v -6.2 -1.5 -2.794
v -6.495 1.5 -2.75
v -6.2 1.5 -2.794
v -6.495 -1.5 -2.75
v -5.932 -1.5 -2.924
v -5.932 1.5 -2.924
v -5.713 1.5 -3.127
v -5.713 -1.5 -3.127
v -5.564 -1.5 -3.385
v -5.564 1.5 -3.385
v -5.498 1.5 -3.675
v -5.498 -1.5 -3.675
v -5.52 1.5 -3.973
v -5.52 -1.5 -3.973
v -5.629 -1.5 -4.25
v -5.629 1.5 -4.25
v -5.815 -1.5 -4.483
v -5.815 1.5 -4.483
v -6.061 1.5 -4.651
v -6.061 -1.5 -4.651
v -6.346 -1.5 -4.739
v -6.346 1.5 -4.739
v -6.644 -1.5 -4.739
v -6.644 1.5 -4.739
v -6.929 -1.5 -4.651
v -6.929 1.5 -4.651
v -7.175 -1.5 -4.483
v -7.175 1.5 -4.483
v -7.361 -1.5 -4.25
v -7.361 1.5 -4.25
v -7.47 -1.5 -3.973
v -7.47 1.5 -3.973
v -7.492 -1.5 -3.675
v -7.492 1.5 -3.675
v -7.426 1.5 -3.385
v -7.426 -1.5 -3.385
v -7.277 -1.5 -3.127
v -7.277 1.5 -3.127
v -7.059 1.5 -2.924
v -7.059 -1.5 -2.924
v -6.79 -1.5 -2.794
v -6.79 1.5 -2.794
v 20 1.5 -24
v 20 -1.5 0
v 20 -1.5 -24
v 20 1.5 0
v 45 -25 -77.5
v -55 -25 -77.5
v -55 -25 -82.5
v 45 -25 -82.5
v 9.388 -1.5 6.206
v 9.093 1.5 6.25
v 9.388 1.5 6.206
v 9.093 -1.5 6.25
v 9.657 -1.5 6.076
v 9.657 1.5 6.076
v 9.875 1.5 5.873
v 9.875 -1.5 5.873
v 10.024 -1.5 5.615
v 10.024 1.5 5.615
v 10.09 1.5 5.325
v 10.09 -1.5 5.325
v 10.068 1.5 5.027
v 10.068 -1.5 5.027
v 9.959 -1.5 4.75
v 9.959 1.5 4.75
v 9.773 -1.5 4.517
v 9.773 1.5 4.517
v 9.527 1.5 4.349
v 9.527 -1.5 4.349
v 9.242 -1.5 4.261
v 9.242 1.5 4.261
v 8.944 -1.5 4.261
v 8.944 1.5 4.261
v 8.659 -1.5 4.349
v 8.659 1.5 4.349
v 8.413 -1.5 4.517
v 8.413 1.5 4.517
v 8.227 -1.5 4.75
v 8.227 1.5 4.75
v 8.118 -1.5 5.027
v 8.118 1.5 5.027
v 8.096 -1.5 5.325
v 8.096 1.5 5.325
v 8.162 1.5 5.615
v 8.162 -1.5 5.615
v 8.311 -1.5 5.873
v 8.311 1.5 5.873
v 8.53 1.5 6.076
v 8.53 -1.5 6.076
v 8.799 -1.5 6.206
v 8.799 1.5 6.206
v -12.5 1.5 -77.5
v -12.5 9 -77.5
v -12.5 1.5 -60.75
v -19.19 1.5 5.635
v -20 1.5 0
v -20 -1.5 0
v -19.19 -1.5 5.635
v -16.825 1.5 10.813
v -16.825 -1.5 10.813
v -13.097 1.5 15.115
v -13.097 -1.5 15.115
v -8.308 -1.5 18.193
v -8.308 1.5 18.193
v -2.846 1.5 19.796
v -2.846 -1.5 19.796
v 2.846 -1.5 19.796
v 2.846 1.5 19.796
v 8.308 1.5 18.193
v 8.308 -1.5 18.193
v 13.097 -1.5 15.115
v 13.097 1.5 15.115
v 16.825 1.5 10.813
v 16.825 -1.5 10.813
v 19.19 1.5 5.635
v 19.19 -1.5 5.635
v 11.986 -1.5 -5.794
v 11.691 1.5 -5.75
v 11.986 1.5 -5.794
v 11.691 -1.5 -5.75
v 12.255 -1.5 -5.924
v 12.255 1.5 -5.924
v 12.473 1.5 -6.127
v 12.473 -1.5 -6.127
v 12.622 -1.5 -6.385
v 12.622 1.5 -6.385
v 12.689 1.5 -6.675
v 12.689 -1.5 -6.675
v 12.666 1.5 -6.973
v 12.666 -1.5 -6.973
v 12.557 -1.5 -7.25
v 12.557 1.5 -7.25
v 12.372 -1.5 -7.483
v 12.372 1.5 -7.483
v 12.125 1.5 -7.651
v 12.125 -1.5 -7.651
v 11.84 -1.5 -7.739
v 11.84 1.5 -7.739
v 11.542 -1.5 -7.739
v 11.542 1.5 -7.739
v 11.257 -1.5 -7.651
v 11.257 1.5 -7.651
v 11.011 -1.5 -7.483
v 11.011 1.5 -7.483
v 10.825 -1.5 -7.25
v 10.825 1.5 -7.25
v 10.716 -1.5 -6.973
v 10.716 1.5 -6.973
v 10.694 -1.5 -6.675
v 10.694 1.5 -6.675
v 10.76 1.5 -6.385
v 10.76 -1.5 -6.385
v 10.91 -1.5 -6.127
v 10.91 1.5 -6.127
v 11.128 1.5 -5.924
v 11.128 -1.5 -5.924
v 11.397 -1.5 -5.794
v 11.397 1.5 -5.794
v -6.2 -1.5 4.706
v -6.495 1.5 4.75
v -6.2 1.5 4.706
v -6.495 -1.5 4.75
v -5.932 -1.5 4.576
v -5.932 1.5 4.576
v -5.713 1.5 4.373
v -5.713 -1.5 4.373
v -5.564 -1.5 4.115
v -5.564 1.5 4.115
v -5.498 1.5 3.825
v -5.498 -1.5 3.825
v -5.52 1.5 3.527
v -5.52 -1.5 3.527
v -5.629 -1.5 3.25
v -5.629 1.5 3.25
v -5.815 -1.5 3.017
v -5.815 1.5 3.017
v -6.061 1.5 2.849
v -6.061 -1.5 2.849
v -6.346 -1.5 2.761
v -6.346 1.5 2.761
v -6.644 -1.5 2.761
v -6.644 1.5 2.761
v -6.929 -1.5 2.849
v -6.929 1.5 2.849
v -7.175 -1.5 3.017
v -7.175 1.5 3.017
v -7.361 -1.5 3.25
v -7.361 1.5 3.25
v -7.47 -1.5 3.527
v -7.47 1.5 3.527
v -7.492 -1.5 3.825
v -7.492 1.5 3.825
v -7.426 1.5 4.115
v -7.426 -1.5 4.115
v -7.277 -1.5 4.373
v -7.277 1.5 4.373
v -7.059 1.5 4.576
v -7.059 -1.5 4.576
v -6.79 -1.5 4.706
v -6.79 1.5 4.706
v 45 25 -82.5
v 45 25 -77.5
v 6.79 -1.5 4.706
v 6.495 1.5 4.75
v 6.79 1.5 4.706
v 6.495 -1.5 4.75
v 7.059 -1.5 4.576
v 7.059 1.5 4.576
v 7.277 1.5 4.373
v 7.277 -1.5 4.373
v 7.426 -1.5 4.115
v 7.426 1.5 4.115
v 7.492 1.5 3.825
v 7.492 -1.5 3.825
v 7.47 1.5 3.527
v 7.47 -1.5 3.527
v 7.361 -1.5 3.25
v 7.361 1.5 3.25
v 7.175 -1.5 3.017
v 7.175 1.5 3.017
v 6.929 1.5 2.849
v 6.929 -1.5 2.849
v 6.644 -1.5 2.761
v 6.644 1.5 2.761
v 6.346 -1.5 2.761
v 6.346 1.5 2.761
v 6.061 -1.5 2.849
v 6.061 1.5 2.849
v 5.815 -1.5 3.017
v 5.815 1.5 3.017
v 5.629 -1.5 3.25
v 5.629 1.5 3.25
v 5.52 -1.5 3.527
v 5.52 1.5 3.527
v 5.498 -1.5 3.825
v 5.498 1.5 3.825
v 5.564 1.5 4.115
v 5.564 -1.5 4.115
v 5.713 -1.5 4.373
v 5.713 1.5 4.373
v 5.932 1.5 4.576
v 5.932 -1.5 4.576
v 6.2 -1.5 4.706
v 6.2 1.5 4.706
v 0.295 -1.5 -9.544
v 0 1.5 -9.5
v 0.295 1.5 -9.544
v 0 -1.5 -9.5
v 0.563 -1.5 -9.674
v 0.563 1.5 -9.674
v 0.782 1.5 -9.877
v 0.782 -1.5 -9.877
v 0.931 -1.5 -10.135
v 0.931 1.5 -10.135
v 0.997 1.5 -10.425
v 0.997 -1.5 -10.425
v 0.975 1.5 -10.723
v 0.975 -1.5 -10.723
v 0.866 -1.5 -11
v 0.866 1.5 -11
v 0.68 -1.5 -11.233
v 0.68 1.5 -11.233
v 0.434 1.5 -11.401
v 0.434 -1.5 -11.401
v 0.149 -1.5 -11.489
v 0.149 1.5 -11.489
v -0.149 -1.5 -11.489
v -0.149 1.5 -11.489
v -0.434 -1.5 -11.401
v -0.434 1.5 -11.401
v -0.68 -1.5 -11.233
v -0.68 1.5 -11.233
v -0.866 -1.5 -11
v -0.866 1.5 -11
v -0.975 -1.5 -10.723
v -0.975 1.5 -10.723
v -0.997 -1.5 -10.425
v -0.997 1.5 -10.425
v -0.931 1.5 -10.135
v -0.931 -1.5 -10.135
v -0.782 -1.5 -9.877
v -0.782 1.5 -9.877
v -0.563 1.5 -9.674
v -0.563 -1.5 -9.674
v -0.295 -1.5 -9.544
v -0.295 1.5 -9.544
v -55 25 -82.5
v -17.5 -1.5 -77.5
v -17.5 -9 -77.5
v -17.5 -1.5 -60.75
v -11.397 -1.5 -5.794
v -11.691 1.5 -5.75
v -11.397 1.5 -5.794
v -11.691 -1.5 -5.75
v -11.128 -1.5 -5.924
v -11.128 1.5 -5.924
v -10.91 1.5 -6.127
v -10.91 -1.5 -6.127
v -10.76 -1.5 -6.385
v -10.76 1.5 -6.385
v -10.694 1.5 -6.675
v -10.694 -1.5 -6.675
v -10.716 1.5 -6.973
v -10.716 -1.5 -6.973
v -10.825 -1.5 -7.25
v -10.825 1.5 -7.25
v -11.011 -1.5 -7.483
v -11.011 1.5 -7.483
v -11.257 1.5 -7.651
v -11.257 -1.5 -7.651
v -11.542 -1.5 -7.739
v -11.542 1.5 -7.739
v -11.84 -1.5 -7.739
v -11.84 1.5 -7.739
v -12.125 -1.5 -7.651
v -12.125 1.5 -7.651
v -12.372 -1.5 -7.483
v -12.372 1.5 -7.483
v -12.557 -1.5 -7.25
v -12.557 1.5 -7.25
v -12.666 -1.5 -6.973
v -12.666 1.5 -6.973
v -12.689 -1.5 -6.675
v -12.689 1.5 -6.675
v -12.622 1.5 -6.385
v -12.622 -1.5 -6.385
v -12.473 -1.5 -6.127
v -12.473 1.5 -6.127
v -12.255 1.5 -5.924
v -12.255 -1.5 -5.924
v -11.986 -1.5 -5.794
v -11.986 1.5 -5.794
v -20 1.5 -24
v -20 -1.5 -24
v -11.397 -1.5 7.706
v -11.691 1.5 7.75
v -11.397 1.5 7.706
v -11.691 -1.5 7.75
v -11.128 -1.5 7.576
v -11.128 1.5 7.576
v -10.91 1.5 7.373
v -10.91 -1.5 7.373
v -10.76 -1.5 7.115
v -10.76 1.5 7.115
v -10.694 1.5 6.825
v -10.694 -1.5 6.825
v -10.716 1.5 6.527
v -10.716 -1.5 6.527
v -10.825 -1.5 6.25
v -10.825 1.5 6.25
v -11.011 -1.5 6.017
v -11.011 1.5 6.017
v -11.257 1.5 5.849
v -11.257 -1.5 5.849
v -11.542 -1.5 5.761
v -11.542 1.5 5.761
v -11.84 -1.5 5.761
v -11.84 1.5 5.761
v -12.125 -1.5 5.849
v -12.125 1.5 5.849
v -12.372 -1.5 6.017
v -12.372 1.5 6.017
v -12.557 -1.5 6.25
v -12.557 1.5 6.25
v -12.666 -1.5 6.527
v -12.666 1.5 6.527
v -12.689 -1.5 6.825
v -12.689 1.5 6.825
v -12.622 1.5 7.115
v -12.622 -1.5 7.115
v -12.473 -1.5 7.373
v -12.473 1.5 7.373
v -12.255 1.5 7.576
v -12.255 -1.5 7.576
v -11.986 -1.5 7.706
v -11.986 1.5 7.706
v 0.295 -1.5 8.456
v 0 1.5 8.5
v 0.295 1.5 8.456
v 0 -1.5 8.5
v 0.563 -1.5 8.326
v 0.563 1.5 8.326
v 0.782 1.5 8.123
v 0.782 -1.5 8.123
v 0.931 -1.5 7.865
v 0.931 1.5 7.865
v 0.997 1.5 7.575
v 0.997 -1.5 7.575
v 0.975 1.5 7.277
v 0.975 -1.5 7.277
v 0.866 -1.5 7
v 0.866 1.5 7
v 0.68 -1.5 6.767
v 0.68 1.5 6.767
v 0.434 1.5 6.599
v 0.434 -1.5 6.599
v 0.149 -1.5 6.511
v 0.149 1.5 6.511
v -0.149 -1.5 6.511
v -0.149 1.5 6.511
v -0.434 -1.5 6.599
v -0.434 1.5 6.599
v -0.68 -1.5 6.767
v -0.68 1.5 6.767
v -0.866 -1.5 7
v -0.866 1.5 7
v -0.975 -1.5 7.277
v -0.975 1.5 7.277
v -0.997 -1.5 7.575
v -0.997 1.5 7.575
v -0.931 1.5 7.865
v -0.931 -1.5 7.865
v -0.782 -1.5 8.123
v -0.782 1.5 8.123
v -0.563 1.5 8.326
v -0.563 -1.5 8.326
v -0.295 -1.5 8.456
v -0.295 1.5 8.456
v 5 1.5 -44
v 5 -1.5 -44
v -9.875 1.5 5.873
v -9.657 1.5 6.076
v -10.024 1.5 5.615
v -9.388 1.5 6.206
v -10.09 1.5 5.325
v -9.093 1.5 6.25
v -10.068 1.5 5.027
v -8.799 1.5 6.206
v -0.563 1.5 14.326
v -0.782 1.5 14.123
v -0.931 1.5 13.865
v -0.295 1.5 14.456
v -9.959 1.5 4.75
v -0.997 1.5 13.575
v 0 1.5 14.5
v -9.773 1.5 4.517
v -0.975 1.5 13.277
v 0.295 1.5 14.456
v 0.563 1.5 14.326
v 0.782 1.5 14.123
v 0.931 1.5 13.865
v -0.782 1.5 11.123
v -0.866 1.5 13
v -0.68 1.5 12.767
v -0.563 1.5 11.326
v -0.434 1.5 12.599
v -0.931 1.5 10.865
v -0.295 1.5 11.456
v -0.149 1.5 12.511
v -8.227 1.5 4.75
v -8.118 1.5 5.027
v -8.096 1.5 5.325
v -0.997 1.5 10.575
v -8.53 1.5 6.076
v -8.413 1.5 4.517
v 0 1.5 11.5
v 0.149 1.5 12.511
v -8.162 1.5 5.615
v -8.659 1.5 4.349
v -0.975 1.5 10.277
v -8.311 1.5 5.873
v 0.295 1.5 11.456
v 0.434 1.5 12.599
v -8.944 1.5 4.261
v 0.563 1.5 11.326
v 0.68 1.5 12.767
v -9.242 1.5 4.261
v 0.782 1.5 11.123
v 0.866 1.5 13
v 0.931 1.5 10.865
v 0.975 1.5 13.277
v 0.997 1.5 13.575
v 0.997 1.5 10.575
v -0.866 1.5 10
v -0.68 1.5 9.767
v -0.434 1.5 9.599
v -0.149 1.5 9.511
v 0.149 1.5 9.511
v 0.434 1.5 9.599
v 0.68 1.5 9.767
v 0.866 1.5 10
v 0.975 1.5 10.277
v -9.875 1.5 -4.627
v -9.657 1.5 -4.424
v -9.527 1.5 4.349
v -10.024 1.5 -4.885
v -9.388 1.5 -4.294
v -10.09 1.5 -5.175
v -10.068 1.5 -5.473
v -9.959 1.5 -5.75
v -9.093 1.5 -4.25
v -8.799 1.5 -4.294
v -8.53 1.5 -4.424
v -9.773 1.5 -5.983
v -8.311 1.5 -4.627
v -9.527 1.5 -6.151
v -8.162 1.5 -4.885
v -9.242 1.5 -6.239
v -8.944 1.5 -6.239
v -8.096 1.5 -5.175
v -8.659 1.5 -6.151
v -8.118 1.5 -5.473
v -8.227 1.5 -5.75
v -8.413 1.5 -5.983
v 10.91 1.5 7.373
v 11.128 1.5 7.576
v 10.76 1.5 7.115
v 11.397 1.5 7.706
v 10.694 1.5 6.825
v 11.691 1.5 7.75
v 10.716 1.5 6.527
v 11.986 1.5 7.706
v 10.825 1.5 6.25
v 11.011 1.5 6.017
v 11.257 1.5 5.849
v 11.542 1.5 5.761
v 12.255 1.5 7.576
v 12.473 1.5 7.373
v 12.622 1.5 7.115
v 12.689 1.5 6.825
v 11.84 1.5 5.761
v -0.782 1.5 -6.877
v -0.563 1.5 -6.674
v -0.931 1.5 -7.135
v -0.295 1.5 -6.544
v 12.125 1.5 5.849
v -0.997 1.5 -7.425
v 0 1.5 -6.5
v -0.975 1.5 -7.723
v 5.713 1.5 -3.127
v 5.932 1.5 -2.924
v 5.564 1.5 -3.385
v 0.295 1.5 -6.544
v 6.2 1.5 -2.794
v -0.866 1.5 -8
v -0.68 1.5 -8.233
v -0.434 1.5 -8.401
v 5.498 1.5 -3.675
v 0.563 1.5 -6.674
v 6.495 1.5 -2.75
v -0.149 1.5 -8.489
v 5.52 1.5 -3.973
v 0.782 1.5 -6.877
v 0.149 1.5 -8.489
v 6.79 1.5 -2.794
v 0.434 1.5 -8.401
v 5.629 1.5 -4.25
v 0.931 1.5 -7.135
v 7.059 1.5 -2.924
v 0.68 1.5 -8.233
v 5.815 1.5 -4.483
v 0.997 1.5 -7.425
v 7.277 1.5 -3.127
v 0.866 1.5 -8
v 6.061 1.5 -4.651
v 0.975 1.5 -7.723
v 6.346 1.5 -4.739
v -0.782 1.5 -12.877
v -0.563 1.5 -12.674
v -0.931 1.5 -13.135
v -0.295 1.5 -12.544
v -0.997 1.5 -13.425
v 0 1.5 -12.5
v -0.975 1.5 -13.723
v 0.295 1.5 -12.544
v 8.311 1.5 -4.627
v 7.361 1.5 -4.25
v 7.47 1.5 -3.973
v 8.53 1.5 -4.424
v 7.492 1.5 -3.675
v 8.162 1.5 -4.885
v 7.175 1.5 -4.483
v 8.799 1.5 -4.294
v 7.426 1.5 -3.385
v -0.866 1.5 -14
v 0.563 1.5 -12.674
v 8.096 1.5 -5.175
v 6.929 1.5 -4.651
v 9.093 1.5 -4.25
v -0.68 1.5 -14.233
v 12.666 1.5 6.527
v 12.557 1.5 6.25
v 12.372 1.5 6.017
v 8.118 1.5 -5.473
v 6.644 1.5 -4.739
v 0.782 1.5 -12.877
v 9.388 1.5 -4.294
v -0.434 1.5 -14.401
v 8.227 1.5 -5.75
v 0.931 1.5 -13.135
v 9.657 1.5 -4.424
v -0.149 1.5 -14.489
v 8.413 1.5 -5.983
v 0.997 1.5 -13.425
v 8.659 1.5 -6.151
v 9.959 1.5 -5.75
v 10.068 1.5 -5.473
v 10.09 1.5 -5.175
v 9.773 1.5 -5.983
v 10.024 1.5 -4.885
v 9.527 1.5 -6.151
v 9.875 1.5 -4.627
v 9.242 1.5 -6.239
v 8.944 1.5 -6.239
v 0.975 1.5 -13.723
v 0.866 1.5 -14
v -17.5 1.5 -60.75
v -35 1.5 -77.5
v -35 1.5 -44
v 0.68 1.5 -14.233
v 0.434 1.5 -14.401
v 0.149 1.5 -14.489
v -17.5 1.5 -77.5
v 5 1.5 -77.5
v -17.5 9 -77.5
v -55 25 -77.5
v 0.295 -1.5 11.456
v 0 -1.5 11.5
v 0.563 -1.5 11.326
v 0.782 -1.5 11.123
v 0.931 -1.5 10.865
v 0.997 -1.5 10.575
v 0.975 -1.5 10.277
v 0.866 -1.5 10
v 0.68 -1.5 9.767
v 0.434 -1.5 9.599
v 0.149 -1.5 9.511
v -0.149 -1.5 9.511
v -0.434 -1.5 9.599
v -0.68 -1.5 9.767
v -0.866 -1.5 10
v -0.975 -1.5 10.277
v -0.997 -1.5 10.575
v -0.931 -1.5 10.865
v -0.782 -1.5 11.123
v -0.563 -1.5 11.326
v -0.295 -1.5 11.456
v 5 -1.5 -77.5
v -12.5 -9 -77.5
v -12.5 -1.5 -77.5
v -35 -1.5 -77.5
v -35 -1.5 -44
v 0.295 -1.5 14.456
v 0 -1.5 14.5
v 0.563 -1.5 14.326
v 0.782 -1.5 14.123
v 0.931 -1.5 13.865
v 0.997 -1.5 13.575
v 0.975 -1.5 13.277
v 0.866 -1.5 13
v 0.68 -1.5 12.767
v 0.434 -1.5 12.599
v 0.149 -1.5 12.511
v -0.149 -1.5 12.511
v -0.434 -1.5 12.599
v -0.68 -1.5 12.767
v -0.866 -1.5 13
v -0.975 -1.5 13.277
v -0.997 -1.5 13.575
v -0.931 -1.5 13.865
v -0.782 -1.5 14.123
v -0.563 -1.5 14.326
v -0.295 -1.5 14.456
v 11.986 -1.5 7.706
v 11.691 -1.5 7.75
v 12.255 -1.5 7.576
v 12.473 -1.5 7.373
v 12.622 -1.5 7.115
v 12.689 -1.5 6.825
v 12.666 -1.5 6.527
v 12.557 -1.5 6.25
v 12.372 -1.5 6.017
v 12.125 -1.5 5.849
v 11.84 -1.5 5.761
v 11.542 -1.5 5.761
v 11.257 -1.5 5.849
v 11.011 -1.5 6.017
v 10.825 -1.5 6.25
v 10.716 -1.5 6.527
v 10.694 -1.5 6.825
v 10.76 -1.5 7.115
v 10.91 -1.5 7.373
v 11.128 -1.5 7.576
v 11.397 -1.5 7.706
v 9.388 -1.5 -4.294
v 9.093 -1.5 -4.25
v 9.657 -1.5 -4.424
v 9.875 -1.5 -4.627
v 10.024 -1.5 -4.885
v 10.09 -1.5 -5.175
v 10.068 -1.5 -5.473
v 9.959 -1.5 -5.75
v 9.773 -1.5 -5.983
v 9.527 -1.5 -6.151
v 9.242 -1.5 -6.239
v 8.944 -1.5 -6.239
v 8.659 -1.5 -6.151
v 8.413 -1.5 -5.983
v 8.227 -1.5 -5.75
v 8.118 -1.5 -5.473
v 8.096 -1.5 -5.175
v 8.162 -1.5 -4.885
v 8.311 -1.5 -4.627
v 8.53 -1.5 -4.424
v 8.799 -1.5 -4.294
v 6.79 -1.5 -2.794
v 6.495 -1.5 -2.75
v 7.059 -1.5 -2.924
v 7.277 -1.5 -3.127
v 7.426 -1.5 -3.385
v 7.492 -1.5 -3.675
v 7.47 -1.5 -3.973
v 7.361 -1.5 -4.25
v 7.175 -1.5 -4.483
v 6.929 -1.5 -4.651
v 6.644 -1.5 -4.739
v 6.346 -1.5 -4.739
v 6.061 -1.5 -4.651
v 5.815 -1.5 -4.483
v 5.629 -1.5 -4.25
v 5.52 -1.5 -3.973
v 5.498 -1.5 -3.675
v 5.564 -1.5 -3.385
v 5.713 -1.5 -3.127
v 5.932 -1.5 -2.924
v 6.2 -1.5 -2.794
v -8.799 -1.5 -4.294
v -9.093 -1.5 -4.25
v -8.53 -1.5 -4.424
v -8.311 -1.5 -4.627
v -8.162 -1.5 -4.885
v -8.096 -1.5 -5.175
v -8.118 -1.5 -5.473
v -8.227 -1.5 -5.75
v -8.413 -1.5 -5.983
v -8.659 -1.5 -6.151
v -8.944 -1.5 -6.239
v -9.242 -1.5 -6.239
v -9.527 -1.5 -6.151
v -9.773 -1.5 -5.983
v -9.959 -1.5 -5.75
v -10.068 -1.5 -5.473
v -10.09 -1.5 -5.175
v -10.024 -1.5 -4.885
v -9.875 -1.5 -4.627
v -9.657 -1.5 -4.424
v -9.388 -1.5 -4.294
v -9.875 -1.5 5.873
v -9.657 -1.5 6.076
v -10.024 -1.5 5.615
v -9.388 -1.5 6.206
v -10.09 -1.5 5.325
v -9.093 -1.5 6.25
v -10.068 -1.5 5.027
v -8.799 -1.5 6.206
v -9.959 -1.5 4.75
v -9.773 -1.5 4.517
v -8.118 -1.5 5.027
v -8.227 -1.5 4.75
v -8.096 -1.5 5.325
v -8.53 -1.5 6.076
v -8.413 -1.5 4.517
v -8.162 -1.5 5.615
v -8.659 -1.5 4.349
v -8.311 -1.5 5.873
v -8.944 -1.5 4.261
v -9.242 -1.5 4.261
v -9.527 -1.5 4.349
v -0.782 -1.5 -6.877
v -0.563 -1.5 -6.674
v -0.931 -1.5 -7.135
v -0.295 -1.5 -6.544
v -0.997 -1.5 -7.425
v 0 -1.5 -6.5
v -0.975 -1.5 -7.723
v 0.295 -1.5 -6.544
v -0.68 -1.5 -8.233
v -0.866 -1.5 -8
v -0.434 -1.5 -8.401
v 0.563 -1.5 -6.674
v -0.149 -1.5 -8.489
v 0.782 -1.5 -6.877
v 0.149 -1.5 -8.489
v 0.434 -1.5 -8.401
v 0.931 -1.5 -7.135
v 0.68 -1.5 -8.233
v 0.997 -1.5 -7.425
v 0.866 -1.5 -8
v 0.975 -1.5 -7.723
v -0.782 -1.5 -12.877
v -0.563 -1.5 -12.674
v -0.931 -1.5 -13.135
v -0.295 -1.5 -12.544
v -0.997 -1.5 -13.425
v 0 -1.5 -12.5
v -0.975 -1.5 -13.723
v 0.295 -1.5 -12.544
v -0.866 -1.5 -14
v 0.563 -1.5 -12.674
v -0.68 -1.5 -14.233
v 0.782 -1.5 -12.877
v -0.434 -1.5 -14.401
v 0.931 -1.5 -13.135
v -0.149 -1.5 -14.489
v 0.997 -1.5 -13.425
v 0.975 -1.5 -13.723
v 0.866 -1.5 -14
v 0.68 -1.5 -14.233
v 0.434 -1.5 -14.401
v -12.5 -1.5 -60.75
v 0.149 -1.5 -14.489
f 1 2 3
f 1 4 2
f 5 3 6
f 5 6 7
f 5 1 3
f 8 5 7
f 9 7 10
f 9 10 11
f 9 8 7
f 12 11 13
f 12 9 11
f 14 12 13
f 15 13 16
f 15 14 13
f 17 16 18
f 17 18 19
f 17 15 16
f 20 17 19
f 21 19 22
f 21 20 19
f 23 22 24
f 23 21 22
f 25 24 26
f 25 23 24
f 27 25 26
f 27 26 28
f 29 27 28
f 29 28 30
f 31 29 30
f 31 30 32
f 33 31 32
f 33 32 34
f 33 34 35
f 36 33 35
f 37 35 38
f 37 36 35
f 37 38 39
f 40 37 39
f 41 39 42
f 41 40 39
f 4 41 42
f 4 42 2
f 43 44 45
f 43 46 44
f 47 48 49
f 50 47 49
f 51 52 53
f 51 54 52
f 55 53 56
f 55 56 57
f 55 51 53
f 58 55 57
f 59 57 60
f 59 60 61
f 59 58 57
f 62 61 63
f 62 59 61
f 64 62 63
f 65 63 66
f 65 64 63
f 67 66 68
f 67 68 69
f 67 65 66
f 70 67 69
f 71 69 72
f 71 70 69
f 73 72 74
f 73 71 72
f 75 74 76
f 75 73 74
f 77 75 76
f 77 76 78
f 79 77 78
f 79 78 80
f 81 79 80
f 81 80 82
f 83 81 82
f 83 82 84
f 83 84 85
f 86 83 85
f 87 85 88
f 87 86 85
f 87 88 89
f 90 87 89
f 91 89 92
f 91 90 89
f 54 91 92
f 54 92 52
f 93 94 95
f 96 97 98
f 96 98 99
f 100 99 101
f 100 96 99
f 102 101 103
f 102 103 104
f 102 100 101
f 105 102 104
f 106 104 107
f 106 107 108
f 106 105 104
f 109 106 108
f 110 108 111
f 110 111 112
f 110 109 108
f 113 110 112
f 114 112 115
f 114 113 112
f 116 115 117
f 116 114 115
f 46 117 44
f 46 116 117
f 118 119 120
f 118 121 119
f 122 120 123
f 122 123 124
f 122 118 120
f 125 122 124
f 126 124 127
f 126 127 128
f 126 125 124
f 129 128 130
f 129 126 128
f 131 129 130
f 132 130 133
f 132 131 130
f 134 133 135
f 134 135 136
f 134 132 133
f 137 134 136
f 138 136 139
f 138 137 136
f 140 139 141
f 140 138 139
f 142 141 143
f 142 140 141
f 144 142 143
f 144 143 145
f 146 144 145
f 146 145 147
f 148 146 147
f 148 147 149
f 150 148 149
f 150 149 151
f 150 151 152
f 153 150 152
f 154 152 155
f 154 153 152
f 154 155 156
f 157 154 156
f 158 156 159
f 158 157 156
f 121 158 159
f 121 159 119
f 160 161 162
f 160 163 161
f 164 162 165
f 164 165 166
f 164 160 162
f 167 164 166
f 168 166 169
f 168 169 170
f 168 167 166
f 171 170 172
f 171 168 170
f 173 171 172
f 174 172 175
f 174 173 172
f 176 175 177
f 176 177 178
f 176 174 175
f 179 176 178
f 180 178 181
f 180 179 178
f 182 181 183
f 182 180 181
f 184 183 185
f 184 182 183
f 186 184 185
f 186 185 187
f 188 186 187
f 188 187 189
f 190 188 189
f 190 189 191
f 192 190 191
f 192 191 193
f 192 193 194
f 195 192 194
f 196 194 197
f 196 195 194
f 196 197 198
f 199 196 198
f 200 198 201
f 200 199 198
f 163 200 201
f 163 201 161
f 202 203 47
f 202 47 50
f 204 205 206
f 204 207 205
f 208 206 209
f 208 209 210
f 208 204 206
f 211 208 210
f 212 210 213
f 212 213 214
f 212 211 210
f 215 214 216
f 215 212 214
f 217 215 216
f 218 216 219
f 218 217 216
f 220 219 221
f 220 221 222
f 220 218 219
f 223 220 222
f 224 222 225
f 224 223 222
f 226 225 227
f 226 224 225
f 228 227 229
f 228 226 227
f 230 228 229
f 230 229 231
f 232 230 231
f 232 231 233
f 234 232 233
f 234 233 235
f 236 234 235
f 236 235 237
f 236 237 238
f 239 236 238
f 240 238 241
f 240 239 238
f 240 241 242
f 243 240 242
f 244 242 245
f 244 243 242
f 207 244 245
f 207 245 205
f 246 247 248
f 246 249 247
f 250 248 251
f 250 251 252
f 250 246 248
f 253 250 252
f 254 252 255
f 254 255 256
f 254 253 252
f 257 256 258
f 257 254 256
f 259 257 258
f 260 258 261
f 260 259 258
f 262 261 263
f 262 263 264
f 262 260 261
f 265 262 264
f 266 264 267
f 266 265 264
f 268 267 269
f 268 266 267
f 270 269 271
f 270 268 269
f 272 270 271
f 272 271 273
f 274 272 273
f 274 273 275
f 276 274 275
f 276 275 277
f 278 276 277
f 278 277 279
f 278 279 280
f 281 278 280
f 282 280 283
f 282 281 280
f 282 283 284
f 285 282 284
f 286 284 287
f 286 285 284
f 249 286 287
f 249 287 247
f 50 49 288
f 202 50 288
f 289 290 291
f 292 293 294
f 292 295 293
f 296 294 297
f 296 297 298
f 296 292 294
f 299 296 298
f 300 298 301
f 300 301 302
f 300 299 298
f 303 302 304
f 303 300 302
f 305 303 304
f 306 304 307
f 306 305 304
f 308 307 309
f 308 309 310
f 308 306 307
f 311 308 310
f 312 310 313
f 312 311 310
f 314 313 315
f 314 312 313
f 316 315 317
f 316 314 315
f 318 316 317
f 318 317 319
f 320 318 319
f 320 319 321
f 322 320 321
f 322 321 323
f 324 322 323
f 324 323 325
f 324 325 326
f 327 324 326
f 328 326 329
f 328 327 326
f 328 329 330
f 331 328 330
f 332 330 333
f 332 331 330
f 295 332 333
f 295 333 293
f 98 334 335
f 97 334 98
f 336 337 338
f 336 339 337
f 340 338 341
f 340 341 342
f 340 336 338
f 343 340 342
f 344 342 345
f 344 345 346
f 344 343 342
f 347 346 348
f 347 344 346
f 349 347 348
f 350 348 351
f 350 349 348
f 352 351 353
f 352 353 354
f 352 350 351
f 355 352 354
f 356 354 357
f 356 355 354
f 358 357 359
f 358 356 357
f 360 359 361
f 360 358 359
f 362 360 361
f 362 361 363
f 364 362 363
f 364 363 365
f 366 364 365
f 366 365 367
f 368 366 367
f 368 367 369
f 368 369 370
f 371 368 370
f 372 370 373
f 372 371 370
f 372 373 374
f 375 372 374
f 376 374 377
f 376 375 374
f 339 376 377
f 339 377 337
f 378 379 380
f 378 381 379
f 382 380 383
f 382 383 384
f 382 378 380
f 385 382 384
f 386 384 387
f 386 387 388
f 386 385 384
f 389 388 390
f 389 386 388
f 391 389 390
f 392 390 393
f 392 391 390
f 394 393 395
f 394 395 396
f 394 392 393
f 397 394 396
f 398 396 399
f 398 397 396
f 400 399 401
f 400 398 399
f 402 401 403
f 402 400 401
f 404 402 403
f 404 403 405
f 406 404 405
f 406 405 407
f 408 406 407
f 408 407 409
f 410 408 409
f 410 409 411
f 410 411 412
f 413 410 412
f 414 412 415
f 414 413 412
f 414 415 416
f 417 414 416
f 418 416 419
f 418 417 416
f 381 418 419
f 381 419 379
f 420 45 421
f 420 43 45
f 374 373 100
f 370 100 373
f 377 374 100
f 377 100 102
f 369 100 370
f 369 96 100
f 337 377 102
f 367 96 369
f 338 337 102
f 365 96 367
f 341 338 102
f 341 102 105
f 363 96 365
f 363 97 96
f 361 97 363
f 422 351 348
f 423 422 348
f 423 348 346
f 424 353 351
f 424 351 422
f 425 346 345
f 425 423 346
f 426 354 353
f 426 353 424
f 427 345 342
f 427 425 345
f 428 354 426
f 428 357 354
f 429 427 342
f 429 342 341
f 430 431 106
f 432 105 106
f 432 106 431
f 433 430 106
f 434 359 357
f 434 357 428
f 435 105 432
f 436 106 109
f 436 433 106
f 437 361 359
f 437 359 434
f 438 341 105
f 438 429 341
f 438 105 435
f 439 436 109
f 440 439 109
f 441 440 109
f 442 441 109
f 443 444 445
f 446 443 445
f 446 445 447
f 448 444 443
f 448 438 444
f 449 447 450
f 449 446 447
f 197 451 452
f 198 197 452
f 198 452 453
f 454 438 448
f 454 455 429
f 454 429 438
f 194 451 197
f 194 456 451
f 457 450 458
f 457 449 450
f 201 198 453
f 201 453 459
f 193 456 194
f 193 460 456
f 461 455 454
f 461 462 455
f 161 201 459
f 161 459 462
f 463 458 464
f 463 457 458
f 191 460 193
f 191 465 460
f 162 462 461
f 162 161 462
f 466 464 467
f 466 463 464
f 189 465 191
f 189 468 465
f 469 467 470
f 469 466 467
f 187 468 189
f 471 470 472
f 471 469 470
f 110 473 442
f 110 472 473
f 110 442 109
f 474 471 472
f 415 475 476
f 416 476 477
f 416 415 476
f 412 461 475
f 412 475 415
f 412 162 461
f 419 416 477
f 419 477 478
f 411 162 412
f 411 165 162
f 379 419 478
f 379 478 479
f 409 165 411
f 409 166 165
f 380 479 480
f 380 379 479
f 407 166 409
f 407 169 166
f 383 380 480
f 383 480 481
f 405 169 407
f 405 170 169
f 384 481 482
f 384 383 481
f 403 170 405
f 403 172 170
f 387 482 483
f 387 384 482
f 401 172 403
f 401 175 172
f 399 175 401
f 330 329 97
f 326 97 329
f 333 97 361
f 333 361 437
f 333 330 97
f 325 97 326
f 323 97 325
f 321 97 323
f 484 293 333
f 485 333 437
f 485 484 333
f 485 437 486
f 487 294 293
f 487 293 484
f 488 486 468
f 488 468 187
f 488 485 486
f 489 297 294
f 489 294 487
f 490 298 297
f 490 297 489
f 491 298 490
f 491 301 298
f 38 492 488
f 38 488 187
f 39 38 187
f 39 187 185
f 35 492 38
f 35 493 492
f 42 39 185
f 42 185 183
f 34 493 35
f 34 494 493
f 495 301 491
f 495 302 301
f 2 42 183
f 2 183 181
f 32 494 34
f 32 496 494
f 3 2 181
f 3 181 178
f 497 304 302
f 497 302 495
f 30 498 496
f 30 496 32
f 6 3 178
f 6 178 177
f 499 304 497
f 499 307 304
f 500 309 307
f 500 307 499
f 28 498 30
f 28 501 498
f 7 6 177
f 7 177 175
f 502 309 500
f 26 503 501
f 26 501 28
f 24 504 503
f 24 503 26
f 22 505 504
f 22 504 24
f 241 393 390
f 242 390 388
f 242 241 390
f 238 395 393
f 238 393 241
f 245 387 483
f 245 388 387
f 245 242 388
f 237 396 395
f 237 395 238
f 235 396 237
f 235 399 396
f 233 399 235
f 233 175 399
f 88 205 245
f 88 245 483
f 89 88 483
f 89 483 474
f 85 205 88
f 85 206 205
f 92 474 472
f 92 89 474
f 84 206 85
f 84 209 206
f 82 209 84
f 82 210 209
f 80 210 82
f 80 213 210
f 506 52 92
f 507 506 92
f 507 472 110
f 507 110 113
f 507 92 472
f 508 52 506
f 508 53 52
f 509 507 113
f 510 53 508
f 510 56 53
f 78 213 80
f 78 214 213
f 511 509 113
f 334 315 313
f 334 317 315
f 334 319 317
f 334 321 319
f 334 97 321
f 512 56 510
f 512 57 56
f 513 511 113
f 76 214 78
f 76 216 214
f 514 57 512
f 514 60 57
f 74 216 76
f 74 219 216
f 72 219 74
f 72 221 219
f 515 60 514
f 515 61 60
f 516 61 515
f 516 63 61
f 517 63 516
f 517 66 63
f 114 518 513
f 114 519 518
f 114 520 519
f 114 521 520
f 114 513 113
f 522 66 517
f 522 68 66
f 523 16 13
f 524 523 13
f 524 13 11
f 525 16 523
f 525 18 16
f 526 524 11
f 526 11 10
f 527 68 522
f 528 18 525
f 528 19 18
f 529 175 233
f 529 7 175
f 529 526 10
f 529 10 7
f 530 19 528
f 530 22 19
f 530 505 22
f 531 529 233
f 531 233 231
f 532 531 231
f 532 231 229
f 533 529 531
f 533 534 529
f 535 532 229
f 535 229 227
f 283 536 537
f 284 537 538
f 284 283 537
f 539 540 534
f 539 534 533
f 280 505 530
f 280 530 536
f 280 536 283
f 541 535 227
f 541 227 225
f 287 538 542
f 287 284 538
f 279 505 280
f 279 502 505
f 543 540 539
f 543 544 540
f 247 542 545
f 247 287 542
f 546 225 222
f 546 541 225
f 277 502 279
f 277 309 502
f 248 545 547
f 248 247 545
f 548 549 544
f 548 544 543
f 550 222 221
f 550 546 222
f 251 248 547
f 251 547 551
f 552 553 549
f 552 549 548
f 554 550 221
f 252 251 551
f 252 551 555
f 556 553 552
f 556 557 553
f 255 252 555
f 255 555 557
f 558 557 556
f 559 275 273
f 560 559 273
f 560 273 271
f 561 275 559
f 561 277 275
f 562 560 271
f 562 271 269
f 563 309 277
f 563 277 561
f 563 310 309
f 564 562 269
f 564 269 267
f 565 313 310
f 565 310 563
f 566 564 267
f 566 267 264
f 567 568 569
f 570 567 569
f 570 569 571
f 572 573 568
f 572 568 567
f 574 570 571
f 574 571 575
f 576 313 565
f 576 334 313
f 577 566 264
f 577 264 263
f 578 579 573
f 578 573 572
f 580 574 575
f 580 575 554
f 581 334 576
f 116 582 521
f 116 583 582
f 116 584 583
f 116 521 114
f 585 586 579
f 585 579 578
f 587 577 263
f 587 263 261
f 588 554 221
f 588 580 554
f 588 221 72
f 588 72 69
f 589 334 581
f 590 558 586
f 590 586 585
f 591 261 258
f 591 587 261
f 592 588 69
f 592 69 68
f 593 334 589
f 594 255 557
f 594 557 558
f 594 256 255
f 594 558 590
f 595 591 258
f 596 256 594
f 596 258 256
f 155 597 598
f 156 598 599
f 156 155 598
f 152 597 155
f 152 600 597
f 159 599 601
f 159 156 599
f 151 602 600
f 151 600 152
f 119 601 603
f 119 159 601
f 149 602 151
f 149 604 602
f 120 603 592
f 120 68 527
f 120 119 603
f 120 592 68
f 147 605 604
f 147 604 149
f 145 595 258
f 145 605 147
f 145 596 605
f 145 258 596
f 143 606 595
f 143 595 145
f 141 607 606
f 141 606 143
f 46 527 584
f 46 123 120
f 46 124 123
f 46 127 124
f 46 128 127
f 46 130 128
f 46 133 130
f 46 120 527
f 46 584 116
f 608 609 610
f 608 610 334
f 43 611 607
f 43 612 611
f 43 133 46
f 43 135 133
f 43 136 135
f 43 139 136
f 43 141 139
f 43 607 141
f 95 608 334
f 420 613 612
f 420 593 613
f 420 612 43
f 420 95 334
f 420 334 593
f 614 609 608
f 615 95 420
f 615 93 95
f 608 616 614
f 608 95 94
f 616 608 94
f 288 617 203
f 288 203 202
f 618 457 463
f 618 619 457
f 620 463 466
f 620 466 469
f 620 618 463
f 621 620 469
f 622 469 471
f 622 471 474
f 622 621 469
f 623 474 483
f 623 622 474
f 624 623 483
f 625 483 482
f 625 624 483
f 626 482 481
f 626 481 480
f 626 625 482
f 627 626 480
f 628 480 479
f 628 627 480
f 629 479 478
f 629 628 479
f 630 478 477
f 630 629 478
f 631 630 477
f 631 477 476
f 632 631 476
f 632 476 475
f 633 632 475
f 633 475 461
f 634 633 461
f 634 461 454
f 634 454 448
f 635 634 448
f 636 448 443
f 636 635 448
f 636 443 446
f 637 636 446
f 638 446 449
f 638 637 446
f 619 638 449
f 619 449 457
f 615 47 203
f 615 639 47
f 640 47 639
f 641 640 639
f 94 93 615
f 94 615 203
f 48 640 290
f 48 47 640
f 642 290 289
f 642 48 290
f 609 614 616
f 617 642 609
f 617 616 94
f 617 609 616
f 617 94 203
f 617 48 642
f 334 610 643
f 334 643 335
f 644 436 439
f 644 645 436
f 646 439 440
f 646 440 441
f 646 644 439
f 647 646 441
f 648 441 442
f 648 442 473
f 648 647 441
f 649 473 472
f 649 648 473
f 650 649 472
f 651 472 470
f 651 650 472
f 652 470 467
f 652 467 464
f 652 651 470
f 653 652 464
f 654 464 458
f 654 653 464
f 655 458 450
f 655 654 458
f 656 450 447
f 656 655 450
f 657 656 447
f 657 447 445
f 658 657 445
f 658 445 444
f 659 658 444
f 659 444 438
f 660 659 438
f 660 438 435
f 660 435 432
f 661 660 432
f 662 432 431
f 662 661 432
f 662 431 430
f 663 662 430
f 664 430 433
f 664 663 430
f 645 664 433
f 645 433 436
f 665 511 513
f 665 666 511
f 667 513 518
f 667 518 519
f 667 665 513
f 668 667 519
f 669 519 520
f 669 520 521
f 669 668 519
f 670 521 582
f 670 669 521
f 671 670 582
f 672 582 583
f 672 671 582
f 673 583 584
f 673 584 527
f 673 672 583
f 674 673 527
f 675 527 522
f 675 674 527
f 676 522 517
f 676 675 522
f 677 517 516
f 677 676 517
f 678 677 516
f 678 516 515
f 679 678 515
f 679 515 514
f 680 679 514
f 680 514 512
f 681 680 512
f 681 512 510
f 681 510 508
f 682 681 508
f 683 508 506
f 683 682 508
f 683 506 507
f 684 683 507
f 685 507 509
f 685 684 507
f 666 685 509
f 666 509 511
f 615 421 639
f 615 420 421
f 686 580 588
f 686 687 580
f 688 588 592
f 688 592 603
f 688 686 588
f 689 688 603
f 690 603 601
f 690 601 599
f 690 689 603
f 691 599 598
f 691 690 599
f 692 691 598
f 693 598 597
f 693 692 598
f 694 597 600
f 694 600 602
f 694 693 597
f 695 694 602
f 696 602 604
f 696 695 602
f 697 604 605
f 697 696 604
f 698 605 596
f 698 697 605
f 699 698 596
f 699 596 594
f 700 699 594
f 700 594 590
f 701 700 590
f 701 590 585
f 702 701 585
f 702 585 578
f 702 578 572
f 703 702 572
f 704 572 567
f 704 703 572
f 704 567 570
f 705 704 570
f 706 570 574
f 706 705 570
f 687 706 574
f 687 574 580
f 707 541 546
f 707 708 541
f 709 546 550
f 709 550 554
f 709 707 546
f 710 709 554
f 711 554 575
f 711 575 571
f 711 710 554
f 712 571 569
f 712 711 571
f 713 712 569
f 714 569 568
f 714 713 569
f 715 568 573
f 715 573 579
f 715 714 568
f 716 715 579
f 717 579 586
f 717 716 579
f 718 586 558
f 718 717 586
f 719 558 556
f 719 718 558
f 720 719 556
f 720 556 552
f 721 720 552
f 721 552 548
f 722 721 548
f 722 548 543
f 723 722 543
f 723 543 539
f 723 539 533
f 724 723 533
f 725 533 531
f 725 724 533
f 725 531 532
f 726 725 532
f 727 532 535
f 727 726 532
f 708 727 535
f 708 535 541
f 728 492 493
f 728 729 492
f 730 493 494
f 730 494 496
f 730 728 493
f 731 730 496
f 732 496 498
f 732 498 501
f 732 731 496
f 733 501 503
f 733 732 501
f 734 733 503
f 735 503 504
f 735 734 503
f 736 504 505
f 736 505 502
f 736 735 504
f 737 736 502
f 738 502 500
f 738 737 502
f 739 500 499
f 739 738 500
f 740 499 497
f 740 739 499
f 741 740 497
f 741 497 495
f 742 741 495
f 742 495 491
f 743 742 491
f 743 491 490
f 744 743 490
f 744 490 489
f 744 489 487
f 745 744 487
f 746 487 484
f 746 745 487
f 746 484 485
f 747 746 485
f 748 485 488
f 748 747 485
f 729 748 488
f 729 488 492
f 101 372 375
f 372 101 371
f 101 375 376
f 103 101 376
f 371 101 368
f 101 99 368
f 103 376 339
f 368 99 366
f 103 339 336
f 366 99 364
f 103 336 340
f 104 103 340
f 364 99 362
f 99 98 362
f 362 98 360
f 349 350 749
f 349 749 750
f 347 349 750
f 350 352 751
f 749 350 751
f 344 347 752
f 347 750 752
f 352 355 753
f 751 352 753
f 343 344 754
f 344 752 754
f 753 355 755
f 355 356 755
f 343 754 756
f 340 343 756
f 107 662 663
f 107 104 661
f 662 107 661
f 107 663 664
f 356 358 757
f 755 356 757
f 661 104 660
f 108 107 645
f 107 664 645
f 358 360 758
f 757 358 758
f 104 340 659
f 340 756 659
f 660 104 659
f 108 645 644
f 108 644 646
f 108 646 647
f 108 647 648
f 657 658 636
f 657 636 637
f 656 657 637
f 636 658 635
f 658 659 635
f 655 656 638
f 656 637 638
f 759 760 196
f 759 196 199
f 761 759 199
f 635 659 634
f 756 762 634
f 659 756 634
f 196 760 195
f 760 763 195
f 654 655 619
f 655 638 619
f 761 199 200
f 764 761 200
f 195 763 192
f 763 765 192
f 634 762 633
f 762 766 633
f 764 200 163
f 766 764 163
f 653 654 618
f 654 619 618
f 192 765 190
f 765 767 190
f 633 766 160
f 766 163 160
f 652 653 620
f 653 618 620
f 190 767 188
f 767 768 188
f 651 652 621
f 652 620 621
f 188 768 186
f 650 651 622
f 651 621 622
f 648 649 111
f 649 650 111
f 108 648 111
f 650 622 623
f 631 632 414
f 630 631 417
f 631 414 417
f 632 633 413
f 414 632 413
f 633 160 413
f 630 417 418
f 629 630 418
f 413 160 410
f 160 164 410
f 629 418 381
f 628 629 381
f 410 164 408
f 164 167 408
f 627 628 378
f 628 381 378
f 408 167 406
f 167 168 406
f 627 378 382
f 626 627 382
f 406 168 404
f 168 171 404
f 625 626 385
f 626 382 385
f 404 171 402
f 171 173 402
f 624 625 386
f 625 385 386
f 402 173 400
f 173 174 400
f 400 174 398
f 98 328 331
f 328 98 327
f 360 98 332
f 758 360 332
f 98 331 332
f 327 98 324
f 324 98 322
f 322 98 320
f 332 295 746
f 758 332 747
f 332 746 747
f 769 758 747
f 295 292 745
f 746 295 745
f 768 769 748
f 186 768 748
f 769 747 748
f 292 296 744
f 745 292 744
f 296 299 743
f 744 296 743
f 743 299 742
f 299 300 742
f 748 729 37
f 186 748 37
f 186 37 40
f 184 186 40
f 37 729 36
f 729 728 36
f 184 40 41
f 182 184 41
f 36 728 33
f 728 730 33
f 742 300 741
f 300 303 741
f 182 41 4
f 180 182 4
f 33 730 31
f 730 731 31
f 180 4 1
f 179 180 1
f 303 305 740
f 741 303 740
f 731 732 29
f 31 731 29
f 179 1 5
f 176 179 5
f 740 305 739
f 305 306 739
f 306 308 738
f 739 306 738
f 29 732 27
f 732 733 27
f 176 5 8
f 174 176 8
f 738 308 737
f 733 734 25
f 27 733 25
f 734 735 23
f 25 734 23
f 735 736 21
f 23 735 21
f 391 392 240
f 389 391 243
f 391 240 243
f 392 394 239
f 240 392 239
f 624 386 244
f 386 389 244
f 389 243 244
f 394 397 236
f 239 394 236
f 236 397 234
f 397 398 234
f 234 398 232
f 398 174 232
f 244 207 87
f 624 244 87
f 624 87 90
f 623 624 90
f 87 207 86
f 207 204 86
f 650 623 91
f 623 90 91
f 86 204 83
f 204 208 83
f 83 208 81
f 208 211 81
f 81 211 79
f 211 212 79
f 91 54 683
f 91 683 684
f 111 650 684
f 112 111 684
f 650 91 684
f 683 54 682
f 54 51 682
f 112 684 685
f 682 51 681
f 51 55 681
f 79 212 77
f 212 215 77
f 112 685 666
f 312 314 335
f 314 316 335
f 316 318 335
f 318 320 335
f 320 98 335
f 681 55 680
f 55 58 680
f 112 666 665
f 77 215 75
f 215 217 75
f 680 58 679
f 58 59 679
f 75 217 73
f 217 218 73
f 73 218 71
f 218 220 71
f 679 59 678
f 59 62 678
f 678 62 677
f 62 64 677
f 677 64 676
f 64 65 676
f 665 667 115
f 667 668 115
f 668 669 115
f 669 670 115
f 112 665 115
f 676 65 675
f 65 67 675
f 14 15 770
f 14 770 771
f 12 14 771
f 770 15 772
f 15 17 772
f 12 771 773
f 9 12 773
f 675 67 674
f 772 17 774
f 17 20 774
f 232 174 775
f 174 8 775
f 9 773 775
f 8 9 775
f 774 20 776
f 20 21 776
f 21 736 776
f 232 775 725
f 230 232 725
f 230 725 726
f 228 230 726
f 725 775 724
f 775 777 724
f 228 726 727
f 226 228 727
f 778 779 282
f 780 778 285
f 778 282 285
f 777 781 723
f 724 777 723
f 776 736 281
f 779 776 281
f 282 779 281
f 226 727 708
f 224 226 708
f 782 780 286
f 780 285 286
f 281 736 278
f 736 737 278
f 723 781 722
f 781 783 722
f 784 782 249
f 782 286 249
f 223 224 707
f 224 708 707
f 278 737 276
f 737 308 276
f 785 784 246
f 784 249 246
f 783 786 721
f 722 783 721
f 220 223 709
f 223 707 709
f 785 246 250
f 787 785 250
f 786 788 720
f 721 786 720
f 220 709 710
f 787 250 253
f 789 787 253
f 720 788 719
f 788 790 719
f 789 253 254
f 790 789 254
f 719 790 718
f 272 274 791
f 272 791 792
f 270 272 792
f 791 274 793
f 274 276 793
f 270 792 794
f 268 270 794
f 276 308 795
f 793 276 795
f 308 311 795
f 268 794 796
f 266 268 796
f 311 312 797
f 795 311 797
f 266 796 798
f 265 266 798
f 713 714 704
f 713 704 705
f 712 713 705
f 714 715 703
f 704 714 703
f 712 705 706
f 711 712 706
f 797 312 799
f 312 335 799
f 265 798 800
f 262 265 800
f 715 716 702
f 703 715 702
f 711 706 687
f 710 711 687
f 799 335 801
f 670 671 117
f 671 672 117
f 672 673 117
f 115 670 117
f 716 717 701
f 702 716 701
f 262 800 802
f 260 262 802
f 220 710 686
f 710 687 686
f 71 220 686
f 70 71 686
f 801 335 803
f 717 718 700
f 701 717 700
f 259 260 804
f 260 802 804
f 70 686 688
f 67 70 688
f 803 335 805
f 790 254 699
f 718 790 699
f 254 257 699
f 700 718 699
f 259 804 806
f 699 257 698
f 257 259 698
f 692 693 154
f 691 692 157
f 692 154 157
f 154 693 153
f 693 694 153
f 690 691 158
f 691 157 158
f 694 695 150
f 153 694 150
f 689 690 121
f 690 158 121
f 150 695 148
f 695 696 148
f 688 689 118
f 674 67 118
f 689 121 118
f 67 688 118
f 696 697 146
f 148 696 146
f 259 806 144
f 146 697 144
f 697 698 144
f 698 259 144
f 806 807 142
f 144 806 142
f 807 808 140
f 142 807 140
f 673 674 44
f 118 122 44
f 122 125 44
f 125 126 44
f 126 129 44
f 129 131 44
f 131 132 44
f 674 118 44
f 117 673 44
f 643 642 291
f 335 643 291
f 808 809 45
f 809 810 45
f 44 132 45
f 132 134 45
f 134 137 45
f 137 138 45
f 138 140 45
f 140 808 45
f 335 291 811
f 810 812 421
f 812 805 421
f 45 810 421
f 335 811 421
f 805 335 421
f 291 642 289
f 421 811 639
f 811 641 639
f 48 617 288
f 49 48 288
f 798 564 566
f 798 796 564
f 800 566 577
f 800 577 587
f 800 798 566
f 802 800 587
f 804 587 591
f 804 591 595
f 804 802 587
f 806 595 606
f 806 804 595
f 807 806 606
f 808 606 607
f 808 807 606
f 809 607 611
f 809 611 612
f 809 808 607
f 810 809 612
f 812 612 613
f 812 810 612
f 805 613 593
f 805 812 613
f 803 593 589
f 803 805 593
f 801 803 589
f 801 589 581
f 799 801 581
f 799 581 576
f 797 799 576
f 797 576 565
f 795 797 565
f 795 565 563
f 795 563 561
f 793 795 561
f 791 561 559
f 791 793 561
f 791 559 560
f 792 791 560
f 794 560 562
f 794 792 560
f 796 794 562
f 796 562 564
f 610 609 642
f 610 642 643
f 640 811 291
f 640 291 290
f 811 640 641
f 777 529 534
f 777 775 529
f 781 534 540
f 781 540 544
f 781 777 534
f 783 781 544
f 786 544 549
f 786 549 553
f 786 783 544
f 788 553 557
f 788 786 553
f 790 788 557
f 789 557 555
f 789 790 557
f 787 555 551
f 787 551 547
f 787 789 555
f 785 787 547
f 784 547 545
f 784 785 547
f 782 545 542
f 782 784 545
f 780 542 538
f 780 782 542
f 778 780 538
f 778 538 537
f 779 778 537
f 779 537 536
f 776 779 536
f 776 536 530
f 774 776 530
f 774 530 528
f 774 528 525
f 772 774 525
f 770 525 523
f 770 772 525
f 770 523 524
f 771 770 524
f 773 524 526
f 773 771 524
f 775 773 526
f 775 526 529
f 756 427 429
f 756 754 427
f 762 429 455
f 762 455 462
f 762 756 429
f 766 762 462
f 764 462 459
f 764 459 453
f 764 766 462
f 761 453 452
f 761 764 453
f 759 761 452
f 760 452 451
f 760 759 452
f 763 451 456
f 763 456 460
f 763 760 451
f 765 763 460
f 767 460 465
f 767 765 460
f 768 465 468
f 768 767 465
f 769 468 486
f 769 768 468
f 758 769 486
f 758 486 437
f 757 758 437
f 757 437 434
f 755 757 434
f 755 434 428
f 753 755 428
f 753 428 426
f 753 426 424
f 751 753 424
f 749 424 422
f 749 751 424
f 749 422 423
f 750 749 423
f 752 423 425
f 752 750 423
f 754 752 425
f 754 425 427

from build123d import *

# Parameters (mm, degrees)
SKETCH1_R                = 1
BOSS_EXTRUDE1_DEPTH      = 1.5
BOSS_EXTRUDE2_DEPTH      = 2.5
BOSS_EXTRUDE3_DEPTH      = 60
BOSS_EXTRUDE3_DEPTH_BACK = 40
SKETCH4_W                = 5
SKETCH4_H                = 50


with BuildPart() as part:
    # Sketch1 → Boss-Extrude1 (new, symmetric)
    with BuildSketch(Plane(origin=(0, 0, 0), x_dir=(1, 0, 0), z_dir=(0, 1, 0))):
        with BuildLine():
            Line((5, 77.5), (-35, 77.5))
            Line((-35, 77.5), (-35, 44))
            Line((-35, 44), (-20, 24))
            Line((-20, 24), (-20, 0))
            ThreePointArc((-20, 0), (0, -20), (20, 0))
            Line((20, 0), (20, 24))
            Line((20, 24), (5, 44))
            Line((5, 44), (5, 77.5))
        make_face()
        with Locations(Location((0, 7.5, 0), (0, 0, 270))):
            Circle(SKETCH1_R, mode=Mode.SUBTRACT)
        with Locations(Location((0, 10.5, 0), (0, 0, 270))):
            Circle(SKETCH1_R, mode=Mode.SUBTRACT)
        with Locations(Location((0, 13.5, 0), (0, 0, 270))):
            Circle(SKETCH1_R, mode=Mode.SUBTRACT)
        with Locations(Location((11.691342951, 6.75, 0), (0, 0, 270))):
            Circle(SKETCH1_R, mode=Mode.SUBTRACT)
        with Locations(Location((6.495190528, 3.75, 0), (0, 0, 270))):
            Circle(SKETCH1_R, mode=Mode.SUBTRACT)
        with Locations(Location((9.09326674, 5.25, 0), (0, 0, 270))):
            Circle(SKETCH1_R, mode=Mode.SUBTRACT)
        with Locations(Location((11.691342951, -6.75, 0), (0, 0, 270))):
            Circle(SKETCH1_R, mode=Mode.SUBTRACT)
        with Locations(Location((6.495190528, -3.75, 0), (0, 0, 270))):
            Circle(SKETCH1_R, mode=Mode.SUBTRACT)
        with Locations(Location((9.09326674, -5.25, 0), (0, 0, 270))):
            Circle(SKETCH1_R, mode=Mode.SUBTRACT)
        with Locations(Location((0, -13.5, 0), (0, 0, 270))):
            Circle(SKETCH1_R, mode=Mode.SUBTRACT)
        with Locations(Location((0, -7.5, 0), (0, 0, 270))):
            Circle(SKETCH1_R, mode=Mode.SUBTRACT)
        with Locations(Location((0, -10.5, 0), (0, 0, 270))):
            Circle(SKETCH1_R, mode=Mode.SUBTRACT)
        with Locations(Location((-11.691342951, -6.75, 0), (0, 0, 270))):
            Circle(SKETCH1_R, mode=Mode.SUBTRACT)
        with Locations(Location((-6.495190528, -3.75, 0), (0, 0, 270))):
            Circle(SKETCH1_R, mode=Mode.SUBTRACT)
        with Locations(Location((-9.09326674, -5.25, 0), (0, 0, 270))):
            Circle(SKETCH1_R, mode=Mode.SUBTRACT)
        with Locations(Location((-11.691342951, 6.75, 0), (0, 0, 270))):
            Circle(SKETCH1_R, mode=Mode.SUBTRACT)
        with Locations(Location((-6.495190528, 3.75, 0), (0, 0, 270))):
            Circle(SKETCH1_R, mode=Mode.SUBTRACT)
        with Locations(Location((-9.09326674, 5.25, 0), (0, 0, 270))):
            Circle(SKETCH1_R, mode=Mode.SUBTRACT)
    extrude(amount=BOSS_EXTRUDE1_DEPTH, both=True)

    # Sketch3 → Boss-Extrude2 (add, symmetric)
    with BuildSketch(Plane(origin=(-15, 0, 0), x_dir=(0, 0, -1), z_dir=(1, 0, 0))):
        Polygon((60.75, 1.5), (77.5, 9), (77.5, 1.5), align=None)
    boss_extrude2 = extrude(amount=BOSS_EXTRUDE2_DEPTH, both=True)

    # Mirror1: Boss-Extrude2 across plane
    add(boss_extrude2.mirror(Plane.ZX))

    # Sketch4 → Boss-Extrude3 (add, two sides: drawn at the far end of the back side and taken through both)
    with BuildSketch(Plane(origin=(-15, 0, 0), x_dir=(0, 0, -1), z_dir=(1, 0, 0)).offset(-BOSS_EXTRUDE3_DEPTH_BACK)):
        with Locations((80, 0)):
            Rectangle(SKETCH4_W, SKETCH4_H)
    extrude(amount=BOSS_EXTRUDE3_DEPTH + BOSS_EXTRUDE3_DEPTH_BACK)


solid = part.part
